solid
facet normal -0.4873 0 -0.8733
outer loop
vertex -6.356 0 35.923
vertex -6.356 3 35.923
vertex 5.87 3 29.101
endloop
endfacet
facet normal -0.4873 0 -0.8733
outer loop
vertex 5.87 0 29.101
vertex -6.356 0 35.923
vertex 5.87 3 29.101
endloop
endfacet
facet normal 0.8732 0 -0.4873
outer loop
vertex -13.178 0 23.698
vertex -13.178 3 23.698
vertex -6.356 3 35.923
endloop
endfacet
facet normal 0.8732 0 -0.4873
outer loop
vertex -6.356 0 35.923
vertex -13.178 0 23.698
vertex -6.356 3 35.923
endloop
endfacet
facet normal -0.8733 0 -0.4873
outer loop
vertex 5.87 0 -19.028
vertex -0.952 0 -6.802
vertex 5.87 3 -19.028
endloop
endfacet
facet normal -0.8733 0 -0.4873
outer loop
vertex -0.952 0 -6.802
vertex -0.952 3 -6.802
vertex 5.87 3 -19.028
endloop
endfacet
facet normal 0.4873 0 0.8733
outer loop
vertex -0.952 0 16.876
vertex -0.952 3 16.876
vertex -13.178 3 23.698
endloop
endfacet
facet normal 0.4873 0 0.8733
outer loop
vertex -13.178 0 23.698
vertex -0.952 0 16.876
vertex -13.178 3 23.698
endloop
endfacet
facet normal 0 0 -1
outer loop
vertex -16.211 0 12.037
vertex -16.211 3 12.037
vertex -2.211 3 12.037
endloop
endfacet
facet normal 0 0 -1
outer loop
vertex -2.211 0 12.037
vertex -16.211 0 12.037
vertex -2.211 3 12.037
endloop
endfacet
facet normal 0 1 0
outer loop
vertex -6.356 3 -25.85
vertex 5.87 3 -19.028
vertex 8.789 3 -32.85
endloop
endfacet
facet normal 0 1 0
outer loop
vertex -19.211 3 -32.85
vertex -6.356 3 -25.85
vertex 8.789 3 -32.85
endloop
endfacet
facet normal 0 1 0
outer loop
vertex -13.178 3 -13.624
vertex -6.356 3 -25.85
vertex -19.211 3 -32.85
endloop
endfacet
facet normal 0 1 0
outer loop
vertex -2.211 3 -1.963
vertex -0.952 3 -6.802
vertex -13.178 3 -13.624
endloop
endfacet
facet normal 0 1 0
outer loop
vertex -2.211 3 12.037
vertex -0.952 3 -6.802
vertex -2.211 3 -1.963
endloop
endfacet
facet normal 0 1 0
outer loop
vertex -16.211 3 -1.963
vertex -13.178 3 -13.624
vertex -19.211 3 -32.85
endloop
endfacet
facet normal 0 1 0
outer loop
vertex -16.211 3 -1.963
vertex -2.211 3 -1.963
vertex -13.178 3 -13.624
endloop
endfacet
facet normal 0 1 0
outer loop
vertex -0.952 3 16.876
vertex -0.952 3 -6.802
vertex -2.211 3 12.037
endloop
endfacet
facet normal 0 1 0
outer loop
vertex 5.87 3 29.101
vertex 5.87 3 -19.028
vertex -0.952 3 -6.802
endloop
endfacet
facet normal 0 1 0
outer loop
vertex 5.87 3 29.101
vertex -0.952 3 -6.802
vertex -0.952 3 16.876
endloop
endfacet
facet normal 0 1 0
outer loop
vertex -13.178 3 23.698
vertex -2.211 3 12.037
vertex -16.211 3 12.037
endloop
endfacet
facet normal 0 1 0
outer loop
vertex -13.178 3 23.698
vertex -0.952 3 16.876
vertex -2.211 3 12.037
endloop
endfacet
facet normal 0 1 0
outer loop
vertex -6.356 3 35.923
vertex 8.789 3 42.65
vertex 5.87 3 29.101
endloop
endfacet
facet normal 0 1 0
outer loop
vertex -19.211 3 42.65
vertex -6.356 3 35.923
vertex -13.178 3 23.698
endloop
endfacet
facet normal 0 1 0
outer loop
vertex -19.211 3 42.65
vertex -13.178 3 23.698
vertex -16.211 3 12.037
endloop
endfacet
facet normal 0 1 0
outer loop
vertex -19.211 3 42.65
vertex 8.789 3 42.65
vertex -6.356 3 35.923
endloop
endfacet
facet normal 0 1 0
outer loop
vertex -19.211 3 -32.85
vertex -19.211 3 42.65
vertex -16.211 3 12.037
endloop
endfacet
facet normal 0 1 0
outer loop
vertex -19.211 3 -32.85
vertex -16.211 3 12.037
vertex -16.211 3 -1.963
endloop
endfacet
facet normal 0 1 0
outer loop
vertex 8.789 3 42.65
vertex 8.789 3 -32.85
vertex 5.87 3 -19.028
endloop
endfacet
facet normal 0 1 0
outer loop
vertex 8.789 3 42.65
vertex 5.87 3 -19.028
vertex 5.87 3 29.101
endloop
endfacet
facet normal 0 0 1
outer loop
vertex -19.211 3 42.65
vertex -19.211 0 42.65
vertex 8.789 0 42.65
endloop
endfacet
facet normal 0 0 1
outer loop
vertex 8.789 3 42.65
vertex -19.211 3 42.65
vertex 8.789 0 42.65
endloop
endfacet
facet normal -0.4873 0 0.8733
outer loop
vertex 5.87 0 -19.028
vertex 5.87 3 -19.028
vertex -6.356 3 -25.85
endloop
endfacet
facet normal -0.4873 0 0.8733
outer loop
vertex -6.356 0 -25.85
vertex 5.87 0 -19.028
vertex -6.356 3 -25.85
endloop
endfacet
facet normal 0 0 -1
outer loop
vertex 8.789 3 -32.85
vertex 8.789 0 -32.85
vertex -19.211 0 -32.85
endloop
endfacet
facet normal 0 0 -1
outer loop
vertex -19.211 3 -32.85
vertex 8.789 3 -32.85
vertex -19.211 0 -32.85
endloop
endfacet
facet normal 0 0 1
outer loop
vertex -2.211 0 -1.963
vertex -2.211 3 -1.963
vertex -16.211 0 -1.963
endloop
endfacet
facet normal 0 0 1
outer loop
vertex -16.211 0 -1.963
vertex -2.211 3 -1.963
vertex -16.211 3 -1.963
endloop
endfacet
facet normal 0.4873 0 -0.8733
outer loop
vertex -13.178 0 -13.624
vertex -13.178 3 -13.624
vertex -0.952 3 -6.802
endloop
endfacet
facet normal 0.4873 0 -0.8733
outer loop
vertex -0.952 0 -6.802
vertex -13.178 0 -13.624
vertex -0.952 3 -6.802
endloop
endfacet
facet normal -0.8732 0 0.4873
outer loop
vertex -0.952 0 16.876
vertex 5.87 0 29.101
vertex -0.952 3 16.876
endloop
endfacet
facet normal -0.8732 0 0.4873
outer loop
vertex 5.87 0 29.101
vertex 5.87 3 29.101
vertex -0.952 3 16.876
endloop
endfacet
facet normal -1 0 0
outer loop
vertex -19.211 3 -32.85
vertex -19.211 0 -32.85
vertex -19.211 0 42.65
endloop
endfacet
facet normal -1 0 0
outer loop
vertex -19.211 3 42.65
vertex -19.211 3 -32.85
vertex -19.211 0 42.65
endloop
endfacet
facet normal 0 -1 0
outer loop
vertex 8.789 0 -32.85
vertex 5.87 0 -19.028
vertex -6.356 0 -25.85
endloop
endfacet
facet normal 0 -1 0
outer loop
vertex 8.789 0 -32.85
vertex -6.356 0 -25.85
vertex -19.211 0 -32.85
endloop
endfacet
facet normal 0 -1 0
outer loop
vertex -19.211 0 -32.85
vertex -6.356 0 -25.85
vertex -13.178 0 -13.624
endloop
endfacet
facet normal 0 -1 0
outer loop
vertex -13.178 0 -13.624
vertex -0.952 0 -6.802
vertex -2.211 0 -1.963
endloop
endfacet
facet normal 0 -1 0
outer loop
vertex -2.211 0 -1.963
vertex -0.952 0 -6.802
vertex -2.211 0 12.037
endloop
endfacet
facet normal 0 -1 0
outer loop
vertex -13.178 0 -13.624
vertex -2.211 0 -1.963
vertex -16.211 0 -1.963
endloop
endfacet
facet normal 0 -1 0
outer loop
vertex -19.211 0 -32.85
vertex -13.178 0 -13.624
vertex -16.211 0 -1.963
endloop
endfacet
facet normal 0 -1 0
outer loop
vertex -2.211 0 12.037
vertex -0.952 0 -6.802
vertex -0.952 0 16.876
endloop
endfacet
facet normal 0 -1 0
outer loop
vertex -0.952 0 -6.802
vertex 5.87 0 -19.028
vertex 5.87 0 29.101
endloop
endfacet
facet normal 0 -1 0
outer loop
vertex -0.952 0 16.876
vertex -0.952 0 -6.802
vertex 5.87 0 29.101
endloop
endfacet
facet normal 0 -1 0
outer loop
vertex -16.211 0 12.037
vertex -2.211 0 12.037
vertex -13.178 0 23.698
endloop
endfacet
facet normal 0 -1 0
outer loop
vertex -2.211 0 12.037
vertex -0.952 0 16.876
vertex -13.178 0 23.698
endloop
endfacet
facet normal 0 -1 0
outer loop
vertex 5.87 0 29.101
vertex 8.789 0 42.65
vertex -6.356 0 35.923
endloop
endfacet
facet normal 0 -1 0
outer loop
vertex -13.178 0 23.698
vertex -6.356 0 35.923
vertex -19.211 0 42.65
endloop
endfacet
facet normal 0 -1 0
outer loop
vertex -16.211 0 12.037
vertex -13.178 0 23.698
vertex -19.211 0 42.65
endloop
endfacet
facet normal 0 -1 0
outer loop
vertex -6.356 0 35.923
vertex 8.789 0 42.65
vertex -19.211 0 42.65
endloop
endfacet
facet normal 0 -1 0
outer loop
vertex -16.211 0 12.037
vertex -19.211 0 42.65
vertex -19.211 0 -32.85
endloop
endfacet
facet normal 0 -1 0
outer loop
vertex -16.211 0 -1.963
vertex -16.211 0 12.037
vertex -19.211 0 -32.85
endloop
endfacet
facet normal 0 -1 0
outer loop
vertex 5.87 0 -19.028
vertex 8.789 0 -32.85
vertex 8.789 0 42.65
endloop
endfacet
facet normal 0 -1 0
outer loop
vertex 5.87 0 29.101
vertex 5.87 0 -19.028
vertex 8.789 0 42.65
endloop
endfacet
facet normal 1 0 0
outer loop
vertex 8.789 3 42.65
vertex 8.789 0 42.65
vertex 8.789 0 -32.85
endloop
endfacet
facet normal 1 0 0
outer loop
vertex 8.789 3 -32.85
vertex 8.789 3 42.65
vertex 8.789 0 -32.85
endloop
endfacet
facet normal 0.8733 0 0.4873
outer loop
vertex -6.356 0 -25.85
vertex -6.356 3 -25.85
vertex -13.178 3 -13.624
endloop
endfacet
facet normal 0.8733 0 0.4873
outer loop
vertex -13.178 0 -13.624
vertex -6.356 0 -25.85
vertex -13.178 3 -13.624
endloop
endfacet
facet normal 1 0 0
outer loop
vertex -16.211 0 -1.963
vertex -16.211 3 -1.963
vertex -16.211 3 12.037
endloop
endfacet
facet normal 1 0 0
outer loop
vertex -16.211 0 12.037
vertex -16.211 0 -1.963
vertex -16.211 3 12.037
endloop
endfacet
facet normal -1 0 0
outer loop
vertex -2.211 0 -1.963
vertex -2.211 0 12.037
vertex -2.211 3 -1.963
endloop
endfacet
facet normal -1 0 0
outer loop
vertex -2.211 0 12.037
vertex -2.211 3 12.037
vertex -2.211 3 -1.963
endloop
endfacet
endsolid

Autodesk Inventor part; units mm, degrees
ref_plane "YZ Plane" through (0, 0, 0) normal (1, 0, 0) x (0, 1, 0)
ref_plane "XZ Plane" through (0, 0, 0) normal (0, 1, 0) x (-1, 0, 0)
ref_plane "XY Plane" through (0, 0, 0) normal (0, 0, 1) x (1, 0, 0)
sketch "Sketch2" plane through (0, 0, 0) normal (0, 1, 0) x (-1, 0, 0)
  line L0 (19.2111, 42.6505) -> (-8.7889, 42.6505)
  line L1 (-8.7889, 42.6505) -> (-8.7889, -32.8495)
  line L2 (-8.7889, -32.8495) -> (19.2111, -32.8495)
  line L3 (19.2111, -32.8495) -> (19.2111, 42.6505)
  dimension "d11" = 75.5
  dimension "d41" = 28
extrude "Extrusion3" add sketch "Sketch2" along normal blind 3
sketch "Sketch6" plane through (0, 3, 0) normal (0, 1, 0) x (1, 0, 0)
  line L0 (-16.2111, -12.0368) -> (-2.2111, -12.0368)
  line L1 (-2.2111, -12.0368) -> (-2.2111, 1.9632)
  line L2 (-2.2111, 1.9632) -> (-16.2111, 1.9632)
  line L3 (-16.2111, 1.9632) -> (-16.2111, -12.0368)
  line L4 (-6.3559, -35.9231) -> (5.8695, -29.1012)
  line L5 (5.8695, -29.1012) -> (-0.9523, -16.8758)
  line L6 (-0.9523, -16.8758) -> (-13.1778, -23.6976)
  line L7 (-13.1778, -23.6976) -> (-6.3559, -35.9231)
  line L8 (-0.9523, 6.8022) -> (5.8695, 19.0276)
  line L9 (5.8695, 19.0276) -> (-6.3559, 25.8495)
  line L10 (-6.3559, 25.8495) -> (-13.1778, 13.6241)
  line L11 (-13.1778, 13.6241) -> (-0.9523, 6.8022)
  circle A0 centre (34.6298, -5.0368) radius 37.5 construction
  line L12 (-19.2111, 32.8495) -> (-19.2111, -42.6505) projected
  line L13 (8.7889, 32.8495) -> (-19.2111, 32.8495) projected
  point P0 (0, 0)
  dimension "d30" = 75
  dimension "d31" = 14
  dimension "d32" = 14
  dimension "d33" = 14
  dimension "d34" = 14
  dimension "d35" = 14
  dimension "d36" = 14
  dimension "d37" = 5
  dimension "d38" = 5
  dimension "d39" = 3
  dimension "d40" = 7
extrude "Extrusion4" cut sketch "Sketch6" against normal through all
properties part number "k2_t_top"
